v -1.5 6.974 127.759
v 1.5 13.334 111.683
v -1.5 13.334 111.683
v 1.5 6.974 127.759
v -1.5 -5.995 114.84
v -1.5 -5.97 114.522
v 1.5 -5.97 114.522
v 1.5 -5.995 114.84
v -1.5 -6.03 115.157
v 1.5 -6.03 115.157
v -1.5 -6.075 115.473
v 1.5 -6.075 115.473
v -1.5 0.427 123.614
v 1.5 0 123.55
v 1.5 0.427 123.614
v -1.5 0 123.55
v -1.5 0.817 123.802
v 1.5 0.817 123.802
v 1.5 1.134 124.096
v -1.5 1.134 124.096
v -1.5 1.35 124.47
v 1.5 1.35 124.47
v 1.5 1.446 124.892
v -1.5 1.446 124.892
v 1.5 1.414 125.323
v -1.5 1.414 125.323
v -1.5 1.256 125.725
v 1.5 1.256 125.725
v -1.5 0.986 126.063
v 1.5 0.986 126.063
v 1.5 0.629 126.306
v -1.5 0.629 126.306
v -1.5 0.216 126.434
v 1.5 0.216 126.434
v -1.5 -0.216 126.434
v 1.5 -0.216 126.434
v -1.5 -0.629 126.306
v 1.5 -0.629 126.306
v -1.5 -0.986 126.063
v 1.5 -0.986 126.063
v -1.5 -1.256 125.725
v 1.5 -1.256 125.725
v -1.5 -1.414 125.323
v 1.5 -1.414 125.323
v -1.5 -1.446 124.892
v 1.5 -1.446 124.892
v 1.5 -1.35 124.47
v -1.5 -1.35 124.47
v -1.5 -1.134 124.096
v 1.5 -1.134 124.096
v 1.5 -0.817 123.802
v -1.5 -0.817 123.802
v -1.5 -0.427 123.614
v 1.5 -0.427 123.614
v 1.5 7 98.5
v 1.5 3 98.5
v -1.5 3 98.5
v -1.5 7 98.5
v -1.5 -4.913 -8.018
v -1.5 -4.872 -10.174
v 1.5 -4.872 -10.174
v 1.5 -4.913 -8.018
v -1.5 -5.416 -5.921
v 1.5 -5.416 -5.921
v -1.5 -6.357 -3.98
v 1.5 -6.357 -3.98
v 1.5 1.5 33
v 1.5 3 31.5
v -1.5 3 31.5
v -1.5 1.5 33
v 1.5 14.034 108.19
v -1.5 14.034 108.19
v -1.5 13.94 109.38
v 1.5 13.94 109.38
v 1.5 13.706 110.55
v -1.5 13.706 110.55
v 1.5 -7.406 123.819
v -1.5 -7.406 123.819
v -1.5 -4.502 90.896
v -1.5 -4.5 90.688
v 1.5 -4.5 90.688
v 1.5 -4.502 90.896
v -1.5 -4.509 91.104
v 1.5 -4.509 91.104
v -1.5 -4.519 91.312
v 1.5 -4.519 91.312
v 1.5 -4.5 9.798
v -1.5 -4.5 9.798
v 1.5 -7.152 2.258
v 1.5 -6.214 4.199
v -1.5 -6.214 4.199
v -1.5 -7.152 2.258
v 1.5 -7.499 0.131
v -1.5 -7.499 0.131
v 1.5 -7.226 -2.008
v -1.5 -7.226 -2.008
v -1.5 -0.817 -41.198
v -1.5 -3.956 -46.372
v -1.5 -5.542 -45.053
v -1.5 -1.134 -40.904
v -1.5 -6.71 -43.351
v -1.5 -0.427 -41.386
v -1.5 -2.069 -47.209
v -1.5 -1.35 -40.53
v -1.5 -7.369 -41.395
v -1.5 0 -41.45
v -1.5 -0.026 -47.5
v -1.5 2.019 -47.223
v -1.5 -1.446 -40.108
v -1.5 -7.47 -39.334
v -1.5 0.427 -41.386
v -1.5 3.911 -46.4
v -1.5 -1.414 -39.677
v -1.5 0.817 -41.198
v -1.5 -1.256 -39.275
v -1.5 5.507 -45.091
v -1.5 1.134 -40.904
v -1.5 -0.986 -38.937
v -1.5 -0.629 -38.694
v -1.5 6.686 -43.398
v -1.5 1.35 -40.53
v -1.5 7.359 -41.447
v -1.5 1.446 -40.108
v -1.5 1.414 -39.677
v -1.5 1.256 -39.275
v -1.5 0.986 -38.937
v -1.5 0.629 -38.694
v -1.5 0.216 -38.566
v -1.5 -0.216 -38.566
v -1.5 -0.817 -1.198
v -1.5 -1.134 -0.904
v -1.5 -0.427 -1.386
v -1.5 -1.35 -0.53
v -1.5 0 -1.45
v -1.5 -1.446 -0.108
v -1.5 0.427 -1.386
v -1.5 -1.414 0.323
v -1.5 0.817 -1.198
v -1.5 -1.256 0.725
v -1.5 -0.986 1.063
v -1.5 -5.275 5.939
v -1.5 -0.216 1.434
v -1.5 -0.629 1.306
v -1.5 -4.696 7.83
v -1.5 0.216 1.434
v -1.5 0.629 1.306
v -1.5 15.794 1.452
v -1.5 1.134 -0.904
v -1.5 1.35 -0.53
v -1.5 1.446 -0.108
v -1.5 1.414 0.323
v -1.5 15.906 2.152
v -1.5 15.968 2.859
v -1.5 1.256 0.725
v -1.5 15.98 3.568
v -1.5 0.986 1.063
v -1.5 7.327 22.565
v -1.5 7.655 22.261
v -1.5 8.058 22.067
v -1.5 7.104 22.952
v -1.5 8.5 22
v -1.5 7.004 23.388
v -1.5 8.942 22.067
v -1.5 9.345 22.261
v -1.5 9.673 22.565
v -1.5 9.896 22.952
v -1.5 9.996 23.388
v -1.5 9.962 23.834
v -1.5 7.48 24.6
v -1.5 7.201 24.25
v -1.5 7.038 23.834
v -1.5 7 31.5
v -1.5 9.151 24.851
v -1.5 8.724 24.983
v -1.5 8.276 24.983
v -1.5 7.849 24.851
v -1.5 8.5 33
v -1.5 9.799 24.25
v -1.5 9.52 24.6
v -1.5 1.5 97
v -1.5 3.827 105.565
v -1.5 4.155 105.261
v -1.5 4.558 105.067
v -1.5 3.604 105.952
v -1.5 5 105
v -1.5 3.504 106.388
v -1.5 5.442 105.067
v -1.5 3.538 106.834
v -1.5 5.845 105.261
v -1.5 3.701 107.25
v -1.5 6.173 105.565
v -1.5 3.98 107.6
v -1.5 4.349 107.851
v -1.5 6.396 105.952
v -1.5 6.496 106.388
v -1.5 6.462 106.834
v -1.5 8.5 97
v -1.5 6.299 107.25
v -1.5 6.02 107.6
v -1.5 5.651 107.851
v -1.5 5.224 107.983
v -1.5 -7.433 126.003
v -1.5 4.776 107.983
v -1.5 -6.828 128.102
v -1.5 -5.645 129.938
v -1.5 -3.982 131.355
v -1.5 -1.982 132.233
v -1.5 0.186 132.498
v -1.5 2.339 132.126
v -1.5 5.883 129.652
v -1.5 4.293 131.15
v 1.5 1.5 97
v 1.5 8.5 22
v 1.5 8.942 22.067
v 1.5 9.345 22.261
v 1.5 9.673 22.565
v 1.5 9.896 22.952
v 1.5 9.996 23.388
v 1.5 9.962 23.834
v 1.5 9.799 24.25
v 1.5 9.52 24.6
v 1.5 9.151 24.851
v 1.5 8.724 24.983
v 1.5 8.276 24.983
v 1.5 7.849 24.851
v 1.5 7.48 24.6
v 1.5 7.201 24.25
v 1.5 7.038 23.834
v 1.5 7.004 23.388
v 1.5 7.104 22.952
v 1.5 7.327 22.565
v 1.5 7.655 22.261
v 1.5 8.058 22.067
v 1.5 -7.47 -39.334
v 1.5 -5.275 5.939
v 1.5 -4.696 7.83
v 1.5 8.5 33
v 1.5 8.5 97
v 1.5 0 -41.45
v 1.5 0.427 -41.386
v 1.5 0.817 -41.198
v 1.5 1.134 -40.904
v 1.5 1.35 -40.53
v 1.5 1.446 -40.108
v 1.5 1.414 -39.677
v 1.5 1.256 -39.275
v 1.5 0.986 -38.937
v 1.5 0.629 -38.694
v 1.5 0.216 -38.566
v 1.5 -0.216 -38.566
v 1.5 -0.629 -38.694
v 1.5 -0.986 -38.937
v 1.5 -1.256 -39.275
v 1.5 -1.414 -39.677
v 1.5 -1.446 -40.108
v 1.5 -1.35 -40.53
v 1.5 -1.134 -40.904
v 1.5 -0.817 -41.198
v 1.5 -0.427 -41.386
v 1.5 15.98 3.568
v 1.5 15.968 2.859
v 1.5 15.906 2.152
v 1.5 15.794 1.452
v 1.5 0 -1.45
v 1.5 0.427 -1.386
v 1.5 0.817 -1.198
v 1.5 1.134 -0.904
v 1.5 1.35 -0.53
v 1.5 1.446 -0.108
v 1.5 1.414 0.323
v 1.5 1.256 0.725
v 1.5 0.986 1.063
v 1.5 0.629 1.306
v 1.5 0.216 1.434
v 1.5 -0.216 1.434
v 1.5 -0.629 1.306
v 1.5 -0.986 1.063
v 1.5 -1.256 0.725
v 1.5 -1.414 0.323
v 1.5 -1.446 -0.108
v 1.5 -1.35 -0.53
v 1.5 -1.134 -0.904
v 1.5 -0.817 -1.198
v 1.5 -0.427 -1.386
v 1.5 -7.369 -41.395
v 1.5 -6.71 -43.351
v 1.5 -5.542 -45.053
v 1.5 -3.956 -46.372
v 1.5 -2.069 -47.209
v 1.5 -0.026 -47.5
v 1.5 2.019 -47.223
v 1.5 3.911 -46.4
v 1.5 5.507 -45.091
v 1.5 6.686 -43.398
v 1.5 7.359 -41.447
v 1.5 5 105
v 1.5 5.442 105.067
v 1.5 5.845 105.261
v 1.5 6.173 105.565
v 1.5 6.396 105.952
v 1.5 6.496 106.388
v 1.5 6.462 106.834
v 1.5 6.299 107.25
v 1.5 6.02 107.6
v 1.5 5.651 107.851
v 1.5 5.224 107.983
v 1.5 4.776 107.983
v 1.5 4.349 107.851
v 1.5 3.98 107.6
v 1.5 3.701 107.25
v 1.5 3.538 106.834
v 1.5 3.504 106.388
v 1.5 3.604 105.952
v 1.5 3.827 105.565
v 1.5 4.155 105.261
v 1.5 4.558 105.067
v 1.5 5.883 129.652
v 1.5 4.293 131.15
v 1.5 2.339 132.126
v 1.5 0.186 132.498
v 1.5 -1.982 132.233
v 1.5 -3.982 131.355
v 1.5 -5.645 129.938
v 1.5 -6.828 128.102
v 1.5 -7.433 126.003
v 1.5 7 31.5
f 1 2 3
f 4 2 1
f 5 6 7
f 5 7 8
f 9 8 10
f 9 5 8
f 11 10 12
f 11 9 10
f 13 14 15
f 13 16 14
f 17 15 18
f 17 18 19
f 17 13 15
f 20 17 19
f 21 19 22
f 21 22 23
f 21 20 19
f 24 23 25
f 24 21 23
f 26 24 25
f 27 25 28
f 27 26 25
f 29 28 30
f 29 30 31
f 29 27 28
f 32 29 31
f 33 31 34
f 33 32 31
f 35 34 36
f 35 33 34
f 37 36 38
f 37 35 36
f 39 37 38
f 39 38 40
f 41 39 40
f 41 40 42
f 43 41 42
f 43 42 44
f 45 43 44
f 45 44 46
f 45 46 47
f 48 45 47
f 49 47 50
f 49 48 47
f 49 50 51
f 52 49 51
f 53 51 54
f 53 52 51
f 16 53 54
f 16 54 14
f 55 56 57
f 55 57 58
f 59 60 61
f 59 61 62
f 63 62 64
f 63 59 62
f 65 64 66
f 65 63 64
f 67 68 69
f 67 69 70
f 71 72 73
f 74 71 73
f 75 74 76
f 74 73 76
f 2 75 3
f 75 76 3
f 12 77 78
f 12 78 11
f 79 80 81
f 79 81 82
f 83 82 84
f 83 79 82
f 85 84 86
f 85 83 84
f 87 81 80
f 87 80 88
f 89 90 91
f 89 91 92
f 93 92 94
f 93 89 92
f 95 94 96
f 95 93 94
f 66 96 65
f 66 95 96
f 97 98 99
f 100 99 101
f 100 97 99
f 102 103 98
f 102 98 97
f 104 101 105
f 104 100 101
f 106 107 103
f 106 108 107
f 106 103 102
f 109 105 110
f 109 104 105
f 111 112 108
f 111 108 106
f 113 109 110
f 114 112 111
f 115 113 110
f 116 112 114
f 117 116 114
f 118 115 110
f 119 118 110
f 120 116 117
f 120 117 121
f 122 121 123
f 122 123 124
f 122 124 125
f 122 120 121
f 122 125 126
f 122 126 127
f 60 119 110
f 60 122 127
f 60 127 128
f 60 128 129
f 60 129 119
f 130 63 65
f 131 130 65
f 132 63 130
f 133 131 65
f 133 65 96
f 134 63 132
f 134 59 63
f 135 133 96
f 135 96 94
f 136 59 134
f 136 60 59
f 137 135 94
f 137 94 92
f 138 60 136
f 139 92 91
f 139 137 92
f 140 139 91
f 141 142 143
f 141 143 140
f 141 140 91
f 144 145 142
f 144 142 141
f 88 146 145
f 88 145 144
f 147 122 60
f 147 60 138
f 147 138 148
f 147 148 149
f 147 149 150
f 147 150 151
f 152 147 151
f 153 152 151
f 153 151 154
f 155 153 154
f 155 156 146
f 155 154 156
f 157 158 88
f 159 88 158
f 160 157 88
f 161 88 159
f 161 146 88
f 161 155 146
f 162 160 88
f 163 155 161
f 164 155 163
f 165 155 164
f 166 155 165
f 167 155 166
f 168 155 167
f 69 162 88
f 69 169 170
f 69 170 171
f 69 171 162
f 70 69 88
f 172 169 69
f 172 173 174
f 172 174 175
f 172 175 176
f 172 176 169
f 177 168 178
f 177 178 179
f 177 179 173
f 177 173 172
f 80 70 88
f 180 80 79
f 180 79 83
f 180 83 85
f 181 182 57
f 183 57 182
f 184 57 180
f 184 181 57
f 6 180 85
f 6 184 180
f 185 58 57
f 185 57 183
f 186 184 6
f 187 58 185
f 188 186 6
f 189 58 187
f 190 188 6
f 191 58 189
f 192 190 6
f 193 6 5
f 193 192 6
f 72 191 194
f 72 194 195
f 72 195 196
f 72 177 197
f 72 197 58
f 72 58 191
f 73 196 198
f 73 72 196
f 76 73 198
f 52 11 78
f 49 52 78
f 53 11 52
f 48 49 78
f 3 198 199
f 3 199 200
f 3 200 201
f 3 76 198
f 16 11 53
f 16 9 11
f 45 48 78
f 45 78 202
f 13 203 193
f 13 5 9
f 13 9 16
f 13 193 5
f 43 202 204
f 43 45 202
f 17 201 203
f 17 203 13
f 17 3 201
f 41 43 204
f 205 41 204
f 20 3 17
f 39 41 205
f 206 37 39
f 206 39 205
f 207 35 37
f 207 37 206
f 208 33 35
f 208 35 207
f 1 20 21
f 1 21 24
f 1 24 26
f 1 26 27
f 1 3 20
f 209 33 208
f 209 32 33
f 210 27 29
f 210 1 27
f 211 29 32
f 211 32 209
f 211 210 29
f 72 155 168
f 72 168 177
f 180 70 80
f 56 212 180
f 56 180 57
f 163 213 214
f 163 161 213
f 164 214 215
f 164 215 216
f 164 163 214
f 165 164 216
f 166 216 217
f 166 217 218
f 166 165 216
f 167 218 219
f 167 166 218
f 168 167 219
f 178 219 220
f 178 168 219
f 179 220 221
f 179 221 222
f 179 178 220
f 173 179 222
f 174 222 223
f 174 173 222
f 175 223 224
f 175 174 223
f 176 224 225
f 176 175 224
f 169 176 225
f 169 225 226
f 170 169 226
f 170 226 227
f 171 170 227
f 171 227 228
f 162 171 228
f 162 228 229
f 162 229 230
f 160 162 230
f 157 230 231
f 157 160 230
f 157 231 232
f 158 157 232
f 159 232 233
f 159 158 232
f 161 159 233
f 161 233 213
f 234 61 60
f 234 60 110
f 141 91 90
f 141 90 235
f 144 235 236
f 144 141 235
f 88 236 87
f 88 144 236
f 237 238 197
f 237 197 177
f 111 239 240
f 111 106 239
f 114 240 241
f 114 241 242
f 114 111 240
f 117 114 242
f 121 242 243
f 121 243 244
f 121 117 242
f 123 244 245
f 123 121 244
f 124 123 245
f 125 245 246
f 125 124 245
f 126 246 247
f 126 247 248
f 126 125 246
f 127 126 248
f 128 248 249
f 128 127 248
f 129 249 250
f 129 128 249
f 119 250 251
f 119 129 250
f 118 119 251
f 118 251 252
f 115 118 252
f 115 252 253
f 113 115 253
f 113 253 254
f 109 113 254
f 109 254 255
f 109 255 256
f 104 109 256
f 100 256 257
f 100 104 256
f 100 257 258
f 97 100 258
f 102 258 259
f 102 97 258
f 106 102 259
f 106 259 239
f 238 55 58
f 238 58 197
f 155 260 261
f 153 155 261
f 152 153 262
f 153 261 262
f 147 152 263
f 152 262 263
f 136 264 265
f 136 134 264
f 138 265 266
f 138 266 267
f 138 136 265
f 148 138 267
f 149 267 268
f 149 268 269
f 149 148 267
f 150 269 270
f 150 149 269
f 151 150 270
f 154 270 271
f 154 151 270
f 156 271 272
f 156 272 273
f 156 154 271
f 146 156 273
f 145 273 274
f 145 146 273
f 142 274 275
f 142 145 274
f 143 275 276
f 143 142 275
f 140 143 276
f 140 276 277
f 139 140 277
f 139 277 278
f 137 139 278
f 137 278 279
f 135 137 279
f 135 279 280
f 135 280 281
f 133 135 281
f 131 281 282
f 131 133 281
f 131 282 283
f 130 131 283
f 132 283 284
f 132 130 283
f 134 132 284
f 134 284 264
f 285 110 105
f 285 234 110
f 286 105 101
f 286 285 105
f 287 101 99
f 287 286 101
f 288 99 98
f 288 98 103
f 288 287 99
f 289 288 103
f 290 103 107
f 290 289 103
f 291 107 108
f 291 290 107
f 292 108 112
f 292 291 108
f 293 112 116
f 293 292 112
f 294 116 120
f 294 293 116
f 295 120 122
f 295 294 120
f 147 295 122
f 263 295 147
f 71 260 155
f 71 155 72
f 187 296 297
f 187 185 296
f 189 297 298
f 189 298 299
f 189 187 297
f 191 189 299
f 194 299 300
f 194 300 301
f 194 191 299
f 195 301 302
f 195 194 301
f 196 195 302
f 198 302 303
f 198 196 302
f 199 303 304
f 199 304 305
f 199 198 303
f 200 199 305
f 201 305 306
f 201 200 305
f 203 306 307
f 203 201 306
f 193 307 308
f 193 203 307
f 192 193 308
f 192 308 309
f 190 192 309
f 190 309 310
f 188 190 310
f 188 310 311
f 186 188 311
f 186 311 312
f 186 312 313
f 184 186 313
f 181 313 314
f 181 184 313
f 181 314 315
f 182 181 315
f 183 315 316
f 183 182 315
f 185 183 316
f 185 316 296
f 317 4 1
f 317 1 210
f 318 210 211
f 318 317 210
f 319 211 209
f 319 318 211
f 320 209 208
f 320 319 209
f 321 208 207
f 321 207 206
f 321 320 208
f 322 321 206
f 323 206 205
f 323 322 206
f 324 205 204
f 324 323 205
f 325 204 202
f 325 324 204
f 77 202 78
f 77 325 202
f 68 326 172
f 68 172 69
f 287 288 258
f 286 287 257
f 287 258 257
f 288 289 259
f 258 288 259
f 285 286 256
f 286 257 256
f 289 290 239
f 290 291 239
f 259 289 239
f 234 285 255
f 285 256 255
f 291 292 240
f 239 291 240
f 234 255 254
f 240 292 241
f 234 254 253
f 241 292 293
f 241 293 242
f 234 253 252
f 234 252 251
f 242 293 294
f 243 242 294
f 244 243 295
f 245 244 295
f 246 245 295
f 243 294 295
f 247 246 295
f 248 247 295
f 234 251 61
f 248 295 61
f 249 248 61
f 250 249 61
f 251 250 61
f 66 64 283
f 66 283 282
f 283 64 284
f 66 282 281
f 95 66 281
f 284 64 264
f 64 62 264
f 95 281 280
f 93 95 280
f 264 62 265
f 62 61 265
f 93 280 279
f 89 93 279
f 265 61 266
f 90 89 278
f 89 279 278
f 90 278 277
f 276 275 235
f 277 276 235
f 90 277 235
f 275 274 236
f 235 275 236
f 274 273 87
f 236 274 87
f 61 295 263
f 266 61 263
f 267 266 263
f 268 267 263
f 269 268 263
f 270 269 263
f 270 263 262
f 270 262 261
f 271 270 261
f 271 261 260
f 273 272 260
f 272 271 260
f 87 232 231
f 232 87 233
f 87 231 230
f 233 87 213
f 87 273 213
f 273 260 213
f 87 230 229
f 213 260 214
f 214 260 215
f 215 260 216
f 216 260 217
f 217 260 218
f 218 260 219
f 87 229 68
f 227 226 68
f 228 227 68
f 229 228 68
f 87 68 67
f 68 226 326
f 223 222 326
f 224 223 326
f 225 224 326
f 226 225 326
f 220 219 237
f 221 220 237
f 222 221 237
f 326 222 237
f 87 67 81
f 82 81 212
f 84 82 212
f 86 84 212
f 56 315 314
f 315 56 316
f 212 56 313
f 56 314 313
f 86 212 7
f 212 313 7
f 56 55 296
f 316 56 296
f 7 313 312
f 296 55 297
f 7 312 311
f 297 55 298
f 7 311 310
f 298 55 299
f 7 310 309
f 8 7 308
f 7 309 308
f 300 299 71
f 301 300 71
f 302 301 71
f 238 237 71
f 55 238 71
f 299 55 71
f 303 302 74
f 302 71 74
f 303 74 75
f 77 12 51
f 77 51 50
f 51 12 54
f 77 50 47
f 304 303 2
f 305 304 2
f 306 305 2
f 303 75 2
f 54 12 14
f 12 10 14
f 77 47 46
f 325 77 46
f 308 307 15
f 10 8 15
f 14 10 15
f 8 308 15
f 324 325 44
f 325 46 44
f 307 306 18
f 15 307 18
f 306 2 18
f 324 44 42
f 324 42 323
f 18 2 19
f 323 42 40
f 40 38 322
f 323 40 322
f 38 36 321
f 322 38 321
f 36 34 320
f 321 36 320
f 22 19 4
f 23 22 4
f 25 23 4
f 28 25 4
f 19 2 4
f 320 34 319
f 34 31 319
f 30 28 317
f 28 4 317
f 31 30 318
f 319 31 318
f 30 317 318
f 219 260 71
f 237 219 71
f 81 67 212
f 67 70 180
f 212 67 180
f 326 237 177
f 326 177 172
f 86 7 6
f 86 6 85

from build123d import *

# Parameters (mm, degrees)
SKETCH1_R           = 1.45
SKETCH1_R_2         = 1.5
BOSS_EXTRUDE1_DEPTH = 1.5
FILLET1_R           = 10


with BuildPart() as part:
    # Sketch1 → Boss-Extrude1 (new, symmetric)
    with BuildSketch(Plane(origin=(0, 0, 0), x_dir=(0, 0, -1), z_dir=(1, 0, 0))):
        with BuildLine():
            Line((-110, 14), (-127.759109434, 6.974045822))
            ThreePointArc((-127.759109434, 6.974045822), (-132.233383985, -1.981957648), (-123.818844483, -7.406407472))
            Line((-123.818844483, -7.406407472), (-115, -6))
            Line((-115, -6), (-91, -4.5))
            Line((-91, -4.5), (-6, -4.5))
            ThreePointArc((-6, -4.5), (0, -7.5), (6, -4.5))
            Line((6, -4.5), (39.334317565, -7.47039938))
            ThreePointArc((39.334317565, -7.47039938), (47.425031601, -1.057783404), (41.446954522, 7.359097948))
            Line((41.446954522, 7.359097948), (-2.5, 16))
            Line((-2.5, 16), (-110, 14))
        make_face()
        with Locations((-125, 0)):
            Circle(SKETCH1_R, mode=Mode.SUBTRACT)
        Circle(SKETCH1_R, mode=Mode.SUBTRACT)
        with Locations((-106.5, 5)):
            Circle(SKETCH1_R_2, mode=Mode.SUBTRACT)
        Polygon((-33, 8.5), (-31.5, 7), (-31.5, 3), (-33, 1.5), (-97, 1.5), (-98.5, 3), (-98.5, 7), (-97, 8.5), align=None, mode=Mode.SUBTRACT)
        with Locations((-23.5, 8.5)):
            Circle(SKETCH1_R_2, mode=Mode.SUBTRACT)
        with Locations((40, 0)):
            Circle(SKETCH1_R, mode=Mode.SUBTRACT)
    extrude(amount=BOSS_EXTRUDE1_DEPTH, both=True)

    # Fillet1
    # the kernel refuses this fillet: 10 mm, written as the material it adds along each edge
    with BuildSketch(Plane(origin=(-1.5, -4.5, -6), x_dir=(0, -0.08875765800116116, -0.9960532506578896), z_dir=(1, 0, 0))) as fillet1_piece_1:
        with BuildLine():
            CenterArc((4.191013496, -10), FILLET1_R, 90, 37.143535998)
            ThreePointArc((-1.847125053, -2.028746469), (-0.83000341, -1.099556568), (0, 0))
            Line((0, 0), (4.191013496, 0))
        make_face()
    extrude(amount=3)
    with BuildSketch(Plane(origin=(-1.5, -4.5, 6), x_dir=(0, -0.689479455343069, -0.7243052399781633), z_dir=(1, 0, 0))) as fillet1_piece_2:
        with BuildLine():
            CenterArc((4.143912969, -9.861667083), FILLET1_R, 99.541184992, 34.04773237)
            Line((-2.750881584, -2.618614683), (0, 0))
            ThreePointArc((0, 0), (1.243173891, -0.103749688), (2.486347782, 0))
        make_face()
    extrude(amount=3)
    with BuildSketch(Plane(origin=(-1.5, -4.5, 91), x_dir=(0, 0, -1), z_dir=(1, 0, 0))) as fillet1_piece_3:
        with BuildLine():
            CenterArc((FILLET1_R * 0.0312195418814, -FILLET1_R), FILLET1_R, 90, 3.576334375)
            Line((-FILLET1_R * 0.0311587442738, -FILLET1_R * 0.00194742151711), (0, 0))
            Line((0, 0), (FILLET1_R * 0.0312195418814, 0))
        make_face()
    extrude(amount=3)
    with BuildSketch(Plane(origin=(-1.5, -6, 115), x_dir=(0, 0.06237828615518053, -0.9980525784828885), z_dir=(1, 0, 0))) as fillet1_piece_4:
        with BuildLine():
            CenterArc((FILLET1_R * 0.04790007143, -FILLET1_R), FILLET1_R, 90, 5.484751657)
            Line((-FILLET1_R * 0.0476807691396, -FILLET1_R * 0.00457832909063), (0, 0))
            Line((0, 0), (FILLET1_R * 0.04790007143, 0))
        make_face()
    extrude(amount=3)
    # the kernel refuses this fillet: 10 mm, written as the material it takes off along each edge
    with BuildSketch(Plane(origin=(-6.025054026, 14, 110), x_dir=(0, 0.018601432156142118, -0.9998269783926319), z_dir=(1, 0, 0))) as fillet1_2_piece_1:
        with BuildLine():
            CenterArc((FILLET1_R * 0.181002161022, -FILLET1_R), FILLET1_R, 90, 20.51916315)
            Line((-FILLET1_R * 0.169518480088, -FILLET1_R * 0.0634449935237), (0, 0))
            Line((0, 0), (FILLET1_R * 0.181002161022, 0))
        make_face()
    extrude(amount=12.050108051, mode=Mode.SUBTRACT)
    with BuildSketch(Plane(origin=(4.169414773, 16, 2.5), x_dir=(0, -0.018601432156142392, 0.9998269783926319), z_dir=(-1, 0, 0))) as fillet1_2_piece_2:
        with BuildLine():
            CenterArc((FILLET1_R * 0.106776590902, -FILLET1_R), FILLET1_R, 90, 12.189510847)
            Line((-FILLET1_R * 0.104369266233, -FILLET1_R * 0.0225454348081), (0, 0))
            Line((0, 0), (FILLET1_R * 0.106776590902, 0))
        make_face()
    extrude(amount=8.338829545, mode=Mode.SUBTRACT)


solid = part.part
